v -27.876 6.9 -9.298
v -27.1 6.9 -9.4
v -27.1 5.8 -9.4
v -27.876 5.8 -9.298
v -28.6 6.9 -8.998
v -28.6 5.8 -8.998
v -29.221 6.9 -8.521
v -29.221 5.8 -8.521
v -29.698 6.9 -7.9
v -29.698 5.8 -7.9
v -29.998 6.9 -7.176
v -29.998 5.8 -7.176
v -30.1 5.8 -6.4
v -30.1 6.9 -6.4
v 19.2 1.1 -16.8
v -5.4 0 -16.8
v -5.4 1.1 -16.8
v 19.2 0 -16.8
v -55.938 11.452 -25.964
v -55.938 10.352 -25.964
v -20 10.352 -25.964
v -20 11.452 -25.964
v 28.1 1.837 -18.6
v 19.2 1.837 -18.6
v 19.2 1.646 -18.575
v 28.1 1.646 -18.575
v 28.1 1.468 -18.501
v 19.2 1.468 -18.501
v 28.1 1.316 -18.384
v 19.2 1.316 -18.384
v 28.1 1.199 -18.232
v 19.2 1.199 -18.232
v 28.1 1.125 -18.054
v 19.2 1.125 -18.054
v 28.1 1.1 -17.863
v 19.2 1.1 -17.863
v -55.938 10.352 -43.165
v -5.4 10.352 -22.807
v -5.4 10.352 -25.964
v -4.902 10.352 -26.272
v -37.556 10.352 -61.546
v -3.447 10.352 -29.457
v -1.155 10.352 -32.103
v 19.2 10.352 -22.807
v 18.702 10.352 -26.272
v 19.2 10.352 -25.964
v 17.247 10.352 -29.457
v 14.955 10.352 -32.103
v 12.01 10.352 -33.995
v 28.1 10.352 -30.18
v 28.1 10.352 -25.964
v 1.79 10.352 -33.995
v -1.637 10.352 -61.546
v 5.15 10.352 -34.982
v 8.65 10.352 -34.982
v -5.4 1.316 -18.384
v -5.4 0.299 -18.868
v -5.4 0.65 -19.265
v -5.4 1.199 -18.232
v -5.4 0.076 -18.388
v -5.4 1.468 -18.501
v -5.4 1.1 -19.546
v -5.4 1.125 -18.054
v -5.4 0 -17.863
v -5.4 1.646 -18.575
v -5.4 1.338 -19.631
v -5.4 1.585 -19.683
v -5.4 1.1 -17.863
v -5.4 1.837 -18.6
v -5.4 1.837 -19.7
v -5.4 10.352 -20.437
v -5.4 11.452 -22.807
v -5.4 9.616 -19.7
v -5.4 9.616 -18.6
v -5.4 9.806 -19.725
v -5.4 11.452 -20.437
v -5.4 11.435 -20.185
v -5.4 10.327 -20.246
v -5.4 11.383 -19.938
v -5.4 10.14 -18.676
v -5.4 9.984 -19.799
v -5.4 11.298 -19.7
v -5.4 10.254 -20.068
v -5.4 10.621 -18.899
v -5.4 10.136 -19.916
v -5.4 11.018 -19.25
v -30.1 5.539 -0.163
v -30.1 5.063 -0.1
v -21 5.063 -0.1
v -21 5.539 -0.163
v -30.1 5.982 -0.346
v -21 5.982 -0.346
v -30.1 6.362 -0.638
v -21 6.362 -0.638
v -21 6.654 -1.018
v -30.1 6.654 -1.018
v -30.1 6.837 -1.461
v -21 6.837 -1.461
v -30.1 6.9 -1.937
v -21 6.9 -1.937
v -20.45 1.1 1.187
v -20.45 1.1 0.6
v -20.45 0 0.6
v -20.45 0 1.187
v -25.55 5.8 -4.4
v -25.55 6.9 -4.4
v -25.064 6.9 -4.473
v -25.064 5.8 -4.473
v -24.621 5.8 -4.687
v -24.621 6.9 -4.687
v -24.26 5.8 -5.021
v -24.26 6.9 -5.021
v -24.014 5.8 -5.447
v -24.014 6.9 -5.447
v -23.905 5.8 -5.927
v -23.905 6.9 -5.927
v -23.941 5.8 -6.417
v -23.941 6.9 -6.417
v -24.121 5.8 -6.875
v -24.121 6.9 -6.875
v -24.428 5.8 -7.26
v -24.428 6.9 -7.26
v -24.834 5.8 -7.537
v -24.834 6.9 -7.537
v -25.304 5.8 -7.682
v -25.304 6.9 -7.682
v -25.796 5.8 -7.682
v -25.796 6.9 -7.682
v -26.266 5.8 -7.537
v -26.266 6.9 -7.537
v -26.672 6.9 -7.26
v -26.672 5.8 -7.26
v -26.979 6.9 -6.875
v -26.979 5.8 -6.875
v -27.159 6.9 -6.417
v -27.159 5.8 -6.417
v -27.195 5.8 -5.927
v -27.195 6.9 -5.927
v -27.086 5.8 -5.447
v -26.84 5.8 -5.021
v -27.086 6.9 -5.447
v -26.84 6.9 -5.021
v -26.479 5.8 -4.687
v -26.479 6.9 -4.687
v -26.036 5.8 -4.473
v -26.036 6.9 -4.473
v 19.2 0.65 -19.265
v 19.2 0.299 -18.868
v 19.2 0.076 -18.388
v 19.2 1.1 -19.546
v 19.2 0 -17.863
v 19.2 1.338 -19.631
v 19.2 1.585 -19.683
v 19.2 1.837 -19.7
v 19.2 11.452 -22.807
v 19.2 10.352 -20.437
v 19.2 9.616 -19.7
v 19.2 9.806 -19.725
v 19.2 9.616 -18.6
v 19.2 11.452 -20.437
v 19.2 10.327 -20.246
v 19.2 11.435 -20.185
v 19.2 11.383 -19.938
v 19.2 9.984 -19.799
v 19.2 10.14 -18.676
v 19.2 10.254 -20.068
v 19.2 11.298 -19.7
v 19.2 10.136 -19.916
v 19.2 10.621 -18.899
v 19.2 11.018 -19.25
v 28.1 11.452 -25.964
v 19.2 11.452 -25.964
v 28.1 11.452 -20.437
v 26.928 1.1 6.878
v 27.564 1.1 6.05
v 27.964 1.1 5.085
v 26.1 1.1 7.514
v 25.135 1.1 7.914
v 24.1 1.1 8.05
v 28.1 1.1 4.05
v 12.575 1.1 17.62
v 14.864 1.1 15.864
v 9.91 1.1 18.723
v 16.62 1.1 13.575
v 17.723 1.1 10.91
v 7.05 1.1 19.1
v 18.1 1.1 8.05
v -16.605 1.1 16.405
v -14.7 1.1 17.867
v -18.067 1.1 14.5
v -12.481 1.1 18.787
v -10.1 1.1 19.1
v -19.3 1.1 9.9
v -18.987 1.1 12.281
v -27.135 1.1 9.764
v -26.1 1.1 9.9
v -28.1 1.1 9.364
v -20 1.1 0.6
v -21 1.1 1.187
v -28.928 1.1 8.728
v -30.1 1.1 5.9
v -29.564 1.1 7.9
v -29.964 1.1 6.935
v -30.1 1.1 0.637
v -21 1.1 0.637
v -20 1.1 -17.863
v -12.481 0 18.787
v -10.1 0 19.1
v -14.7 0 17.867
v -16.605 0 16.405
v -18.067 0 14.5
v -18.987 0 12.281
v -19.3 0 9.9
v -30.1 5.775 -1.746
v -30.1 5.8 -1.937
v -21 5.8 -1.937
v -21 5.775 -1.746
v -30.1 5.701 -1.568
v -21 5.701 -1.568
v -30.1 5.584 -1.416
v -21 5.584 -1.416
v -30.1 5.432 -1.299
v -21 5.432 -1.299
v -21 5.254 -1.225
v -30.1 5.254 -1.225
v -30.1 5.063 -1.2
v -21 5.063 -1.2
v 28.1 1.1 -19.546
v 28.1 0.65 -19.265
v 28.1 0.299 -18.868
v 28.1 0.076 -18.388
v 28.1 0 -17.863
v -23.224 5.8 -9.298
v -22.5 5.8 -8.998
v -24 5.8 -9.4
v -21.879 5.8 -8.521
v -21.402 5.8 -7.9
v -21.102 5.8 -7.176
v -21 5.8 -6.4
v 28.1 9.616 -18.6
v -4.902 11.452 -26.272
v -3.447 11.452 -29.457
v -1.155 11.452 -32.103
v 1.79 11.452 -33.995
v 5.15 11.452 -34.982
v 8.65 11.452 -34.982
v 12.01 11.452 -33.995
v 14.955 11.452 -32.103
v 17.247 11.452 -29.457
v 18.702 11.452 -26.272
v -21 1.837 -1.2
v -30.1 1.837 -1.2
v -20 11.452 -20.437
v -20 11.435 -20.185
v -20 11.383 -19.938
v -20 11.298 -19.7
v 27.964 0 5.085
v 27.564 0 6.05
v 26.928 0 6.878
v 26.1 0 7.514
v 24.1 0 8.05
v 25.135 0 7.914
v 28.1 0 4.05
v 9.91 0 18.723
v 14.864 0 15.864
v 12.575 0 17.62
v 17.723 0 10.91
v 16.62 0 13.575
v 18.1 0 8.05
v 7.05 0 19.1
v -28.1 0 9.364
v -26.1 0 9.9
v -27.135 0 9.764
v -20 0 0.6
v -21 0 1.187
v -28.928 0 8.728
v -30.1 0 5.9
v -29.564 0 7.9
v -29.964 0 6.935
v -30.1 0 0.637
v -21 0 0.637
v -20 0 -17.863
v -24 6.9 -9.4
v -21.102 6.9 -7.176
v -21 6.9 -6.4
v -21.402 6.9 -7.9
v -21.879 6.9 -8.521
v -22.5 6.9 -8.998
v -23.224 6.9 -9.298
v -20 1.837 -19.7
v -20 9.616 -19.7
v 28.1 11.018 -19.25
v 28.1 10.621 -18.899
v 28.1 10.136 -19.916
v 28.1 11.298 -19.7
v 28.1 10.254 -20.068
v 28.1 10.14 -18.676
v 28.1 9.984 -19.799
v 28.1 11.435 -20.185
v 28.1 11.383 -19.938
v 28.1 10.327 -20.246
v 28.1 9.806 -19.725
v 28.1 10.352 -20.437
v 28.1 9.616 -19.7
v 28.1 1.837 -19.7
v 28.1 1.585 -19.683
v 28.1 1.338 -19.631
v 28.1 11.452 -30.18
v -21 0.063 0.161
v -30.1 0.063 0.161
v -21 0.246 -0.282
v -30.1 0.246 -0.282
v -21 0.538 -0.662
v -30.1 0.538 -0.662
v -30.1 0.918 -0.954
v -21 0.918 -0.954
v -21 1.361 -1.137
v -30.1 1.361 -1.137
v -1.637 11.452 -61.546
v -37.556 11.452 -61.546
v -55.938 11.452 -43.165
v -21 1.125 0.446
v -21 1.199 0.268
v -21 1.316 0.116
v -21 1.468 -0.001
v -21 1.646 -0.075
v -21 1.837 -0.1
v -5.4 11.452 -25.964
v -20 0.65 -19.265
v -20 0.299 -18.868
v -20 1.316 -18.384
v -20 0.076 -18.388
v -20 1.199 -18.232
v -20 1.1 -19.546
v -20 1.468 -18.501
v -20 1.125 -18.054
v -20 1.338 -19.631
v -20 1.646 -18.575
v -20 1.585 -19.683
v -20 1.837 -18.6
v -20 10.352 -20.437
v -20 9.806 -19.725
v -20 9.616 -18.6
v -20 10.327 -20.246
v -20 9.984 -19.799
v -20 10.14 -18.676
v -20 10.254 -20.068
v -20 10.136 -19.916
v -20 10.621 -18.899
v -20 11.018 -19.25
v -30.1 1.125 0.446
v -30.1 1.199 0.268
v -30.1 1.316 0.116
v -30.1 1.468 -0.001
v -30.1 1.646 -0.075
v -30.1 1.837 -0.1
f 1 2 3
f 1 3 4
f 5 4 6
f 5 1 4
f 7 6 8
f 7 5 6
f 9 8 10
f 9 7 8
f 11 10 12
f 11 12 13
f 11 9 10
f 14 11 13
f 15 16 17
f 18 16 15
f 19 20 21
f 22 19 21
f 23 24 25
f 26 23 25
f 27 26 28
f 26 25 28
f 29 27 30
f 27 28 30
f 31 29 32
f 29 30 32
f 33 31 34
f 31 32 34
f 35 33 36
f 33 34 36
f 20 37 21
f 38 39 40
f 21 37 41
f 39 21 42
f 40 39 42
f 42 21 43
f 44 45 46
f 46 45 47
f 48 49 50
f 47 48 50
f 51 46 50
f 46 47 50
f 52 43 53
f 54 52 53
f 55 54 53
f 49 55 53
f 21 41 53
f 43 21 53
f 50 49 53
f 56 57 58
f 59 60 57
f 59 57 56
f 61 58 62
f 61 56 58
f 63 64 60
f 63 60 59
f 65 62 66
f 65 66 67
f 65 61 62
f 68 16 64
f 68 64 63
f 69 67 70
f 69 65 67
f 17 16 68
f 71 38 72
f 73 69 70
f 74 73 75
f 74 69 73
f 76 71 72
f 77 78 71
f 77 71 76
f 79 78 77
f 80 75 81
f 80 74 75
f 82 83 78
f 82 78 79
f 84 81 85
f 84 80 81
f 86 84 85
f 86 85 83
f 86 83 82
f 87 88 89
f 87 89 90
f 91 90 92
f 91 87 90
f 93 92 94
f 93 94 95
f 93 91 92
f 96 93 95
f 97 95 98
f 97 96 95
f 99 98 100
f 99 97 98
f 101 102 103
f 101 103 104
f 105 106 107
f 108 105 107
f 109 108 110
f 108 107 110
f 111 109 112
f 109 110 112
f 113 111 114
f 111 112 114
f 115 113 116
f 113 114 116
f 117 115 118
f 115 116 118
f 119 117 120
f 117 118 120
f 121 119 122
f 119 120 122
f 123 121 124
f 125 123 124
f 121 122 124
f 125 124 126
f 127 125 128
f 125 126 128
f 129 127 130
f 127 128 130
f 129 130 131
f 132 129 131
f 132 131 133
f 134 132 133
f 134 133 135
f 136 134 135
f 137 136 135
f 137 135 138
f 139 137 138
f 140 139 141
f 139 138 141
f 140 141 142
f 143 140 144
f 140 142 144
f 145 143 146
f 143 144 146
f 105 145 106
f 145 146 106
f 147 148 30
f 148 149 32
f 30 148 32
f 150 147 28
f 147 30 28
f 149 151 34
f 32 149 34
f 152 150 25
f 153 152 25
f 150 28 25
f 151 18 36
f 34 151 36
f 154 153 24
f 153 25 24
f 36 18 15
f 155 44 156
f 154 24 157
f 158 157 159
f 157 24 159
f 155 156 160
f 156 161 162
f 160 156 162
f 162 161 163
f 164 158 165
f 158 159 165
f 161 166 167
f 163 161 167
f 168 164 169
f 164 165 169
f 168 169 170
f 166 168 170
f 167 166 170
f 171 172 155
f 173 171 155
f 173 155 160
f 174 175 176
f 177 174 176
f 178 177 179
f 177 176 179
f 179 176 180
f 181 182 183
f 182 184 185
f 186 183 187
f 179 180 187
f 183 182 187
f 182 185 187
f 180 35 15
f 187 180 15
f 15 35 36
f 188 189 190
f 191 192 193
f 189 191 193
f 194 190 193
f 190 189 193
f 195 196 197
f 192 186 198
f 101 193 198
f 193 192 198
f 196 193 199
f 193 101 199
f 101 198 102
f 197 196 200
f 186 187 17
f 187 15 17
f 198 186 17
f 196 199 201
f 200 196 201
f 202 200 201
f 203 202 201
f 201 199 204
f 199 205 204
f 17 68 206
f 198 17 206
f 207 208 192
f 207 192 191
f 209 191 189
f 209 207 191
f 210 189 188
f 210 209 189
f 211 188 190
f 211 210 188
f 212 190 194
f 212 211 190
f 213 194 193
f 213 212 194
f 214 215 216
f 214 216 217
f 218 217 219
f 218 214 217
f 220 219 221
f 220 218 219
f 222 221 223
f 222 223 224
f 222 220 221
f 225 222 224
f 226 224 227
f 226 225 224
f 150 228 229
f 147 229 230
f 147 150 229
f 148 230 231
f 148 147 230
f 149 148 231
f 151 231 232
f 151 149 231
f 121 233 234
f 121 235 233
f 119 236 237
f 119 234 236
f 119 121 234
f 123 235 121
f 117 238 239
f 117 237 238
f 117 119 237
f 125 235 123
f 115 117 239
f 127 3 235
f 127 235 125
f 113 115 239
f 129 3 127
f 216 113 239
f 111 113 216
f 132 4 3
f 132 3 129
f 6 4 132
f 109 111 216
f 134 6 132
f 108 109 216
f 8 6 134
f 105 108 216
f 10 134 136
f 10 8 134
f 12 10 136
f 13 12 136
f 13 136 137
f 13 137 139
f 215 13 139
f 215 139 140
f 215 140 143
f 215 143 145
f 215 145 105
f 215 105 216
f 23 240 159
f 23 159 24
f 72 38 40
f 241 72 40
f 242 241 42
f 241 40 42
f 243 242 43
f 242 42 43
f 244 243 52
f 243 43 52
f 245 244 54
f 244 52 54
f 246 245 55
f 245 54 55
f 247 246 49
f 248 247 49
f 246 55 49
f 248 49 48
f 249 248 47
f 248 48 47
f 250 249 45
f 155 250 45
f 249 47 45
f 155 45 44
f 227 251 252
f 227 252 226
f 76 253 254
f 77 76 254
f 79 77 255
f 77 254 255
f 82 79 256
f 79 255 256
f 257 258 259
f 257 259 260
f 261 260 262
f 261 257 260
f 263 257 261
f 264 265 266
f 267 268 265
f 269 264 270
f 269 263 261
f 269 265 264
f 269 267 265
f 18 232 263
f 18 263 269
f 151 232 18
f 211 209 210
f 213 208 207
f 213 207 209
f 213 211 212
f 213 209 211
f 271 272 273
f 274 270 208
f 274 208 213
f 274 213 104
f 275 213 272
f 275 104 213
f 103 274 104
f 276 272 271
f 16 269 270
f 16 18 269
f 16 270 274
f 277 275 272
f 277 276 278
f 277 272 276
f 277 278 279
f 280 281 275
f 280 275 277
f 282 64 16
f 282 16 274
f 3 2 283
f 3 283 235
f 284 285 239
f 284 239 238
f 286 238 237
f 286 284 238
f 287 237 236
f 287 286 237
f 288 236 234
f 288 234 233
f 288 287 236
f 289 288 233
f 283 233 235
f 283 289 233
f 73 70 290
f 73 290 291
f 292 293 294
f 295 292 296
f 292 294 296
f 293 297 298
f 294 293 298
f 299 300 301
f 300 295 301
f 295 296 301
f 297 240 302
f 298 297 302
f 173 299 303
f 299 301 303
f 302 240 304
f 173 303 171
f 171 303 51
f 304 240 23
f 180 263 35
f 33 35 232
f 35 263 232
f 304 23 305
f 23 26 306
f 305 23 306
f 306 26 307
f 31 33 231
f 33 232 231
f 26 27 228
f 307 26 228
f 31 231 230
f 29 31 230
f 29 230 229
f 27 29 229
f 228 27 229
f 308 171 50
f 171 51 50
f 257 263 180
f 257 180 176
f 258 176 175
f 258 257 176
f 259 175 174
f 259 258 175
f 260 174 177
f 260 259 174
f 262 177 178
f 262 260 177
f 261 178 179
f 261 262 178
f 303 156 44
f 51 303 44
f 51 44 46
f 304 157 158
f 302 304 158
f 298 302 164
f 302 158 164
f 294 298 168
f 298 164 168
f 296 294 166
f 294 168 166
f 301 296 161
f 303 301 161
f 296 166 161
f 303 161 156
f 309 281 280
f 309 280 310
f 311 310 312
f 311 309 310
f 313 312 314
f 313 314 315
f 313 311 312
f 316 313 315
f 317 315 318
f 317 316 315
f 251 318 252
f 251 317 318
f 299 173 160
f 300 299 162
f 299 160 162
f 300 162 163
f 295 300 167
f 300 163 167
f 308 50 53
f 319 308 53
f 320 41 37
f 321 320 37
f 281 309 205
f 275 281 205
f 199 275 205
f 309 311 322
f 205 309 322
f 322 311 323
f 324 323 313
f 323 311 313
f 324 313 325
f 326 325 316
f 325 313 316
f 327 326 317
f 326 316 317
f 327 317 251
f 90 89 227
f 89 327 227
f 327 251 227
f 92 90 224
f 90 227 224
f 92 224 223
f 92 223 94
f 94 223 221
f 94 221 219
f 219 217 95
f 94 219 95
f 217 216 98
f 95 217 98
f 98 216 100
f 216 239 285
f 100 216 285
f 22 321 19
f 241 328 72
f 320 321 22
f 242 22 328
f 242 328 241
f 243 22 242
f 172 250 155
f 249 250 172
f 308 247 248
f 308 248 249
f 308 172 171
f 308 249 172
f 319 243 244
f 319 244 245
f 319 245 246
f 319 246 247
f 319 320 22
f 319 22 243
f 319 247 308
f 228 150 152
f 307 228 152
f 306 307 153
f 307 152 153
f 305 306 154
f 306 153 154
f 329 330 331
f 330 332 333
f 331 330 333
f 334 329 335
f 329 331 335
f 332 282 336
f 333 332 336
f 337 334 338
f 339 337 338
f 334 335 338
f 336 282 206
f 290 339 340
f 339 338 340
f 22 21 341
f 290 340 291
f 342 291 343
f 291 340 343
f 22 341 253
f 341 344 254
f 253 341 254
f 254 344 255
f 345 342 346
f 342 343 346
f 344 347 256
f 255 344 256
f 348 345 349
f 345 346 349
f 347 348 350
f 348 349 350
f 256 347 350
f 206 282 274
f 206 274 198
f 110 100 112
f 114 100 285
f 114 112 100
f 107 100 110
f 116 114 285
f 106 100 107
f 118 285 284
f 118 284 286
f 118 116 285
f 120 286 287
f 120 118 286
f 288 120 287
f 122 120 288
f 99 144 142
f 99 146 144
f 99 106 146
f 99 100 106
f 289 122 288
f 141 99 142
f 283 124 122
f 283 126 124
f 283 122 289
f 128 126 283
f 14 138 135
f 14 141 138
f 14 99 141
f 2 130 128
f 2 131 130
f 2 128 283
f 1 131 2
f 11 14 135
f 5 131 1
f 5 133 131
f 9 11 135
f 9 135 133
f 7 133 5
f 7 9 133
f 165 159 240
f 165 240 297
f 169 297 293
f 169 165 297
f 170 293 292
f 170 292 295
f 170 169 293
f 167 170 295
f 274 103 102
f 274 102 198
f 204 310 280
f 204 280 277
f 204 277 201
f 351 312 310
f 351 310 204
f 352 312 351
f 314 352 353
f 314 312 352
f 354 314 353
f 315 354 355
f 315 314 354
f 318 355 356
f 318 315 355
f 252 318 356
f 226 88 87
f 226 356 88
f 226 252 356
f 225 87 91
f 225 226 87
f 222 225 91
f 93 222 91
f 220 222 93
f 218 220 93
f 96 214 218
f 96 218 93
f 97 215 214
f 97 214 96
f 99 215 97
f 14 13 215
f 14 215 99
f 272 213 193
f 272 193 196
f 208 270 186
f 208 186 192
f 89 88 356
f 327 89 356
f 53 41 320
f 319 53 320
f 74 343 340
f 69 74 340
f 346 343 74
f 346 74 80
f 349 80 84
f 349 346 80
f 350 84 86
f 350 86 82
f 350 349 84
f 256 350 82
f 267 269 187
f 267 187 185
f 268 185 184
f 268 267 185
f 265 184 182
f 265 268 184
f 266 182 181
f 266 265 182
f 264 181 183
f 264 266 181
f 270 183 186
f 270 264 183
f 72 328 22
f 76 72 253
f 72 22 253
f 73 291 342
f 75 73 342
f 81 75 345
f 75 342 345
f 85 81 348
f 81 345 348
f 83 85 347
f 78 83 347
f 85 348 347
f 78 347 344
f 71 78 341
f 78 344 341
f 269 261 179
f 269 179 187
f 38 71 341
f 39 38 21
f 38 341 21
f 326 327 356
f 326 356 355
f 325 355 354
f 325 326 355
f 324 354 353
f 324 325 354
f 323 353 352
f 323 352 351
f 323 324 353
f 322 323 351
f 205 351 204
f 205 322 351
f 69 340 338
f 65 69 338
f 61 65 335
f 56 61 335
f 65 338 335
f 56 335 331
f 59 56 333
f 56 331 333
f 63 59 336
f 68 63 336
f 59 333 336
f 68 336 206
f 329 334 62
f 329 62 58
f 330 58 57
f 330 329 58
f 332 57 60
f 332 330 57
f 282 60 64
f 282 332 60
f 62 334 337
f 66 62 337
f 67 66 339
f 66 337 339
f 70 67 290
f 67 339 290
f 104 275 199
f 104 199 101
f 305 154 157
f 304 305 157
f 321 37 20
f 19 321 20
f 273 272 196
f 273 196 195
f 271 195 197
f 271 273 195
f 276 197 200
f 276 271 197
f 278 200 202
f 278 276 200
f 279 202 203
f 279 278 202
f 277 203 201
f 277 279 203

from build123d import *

# Parameters (mm, degrees)
BASE_FLANGE1_DEPTH            = 1.1
EDGE_FLANGE1_STRIP_W          = 5.8732
EDGE_FLANGE1_STRIP_H          = 1.1
EDGE_FLANGE1_STRIP_CUT_DEPTH  = 9.1
EDGE_FLANGE1_RELIEF_W         = 6.4232
EDGE_FLANGE1_RELIEF_H         = 0.55
EDGE_FLANGE1_RELIEF_CUT_DEPTH = 1.1
EDGE_FLANGE1_DEPTH            = 9.1
EDGE_FLANGE2_STRIP_W          = 5.8732
EDGE_FLANGE2_STRIP_H          = 1.1
EDGE_FLANGE2_STRIP_CUT_DEPTH  = 9.1
EDGE_FLANGE2_DEPTH            = 9.1
SKETCH9_R                     = 1.65
EXTRUDE1_DEPTH                = 1.1
SKETCHED_START                = -55.937504649
SKETCHED_BEND2_DEPTH          = 84.037504649
SKETCHED_START_2              = -37.556301802
SKETCHED_BEND2_2_OUTLINE_W    = 35.581961475
SKETCHED_BEND2_2_OUTLINE_H    = 1.1
SKETCHED_BEND2_2_DEPTH        = 32.156301802
SKETCHED_START_3              = -20
SKETCHED_BEND2_3_DEPTH        = 14.6
SKETCHED_START_4              = 19.2
SKETCHED_BEND2_4_DEPTH        = 8.9
SKETCHED_START_5              = -19.700000012
SKETCHED_BEND2_5_DEPTH        = 1.100000011
SKETCHED_BEND5_DEPTH          = 84.037504649
SKETCHED_BEND5_2_OUTLINE_W    = 1.1
SKETCHED_BEND5_2_OUTLINE_H    = 35.581961474
SKETCHED_BEND5_2_DEPTH        = 32.156301802
SKETCHED_BEND5_3_DEPTH        = 14.6
SKETCHED_BEND5_4_DEPTH        = 8.9
SKETCHED_START_6              = 10.352213433
SKETCHED_BEND5_5_DEPTH        = 1.1


with BuildPart() as part:
    # Base-Flange1: sheet metal written as solids
    # Sketch1 → Base-Flange1 (new body)
    with BuildSketch(Plane(origin=(0, 0, 0), x_dir=(1, 0, 0), z_dir=(0, 1, 0))):
        with BuildLine():
            Line((-30.1, 1.2), (-21, 1.2))
            Line((-21, 1.2), (-21, -0.6))
            Line((-21, -0.6), (-20, -0.6))
            Line((-20, -0.6), (-20, 19.7))
            Line((-20, 19.7), (-20, 32.054788892))
            Line((-20, 32.054788892), (-20, 35.211930536))
            Line((-20, 35.211930536), (-55.937504649, 35.211930536))
            Line((-55.937504649, 35.211930536), (-55.937504649, 52.412689164))
            Line((-55.937504649, 52.412689164), (-37.556301802, 70.793892011))
            Line((-37.556301802, 70.793892011), (-1.637070551, 70.793892011))
            Line((-1.637070551, 70.793892011), (28.1, 39.427802749))
            Line((28.1, 39.427802749), (28.1, 32.054788892))
            Line((28.1, 32.054788892), (28.1, 19.7))
            Line((28.1, 19.7), (28.1, -4.05))
            ThreePointArc((28.1, -4.05), (26.928427125, -6.878427125), (24.1, -8.05))
            Line((24.1, -8.05), (18.1, -8.05))
            ThreePointArc((18.1, -8.05), (14.863529932, -15.863529932), (7.05, -19.1))
            Line((7.05, -19.1), (-10.1, -19.1))
            ThreePointArc((-10.1, -19.1), (-16.605382387, -16.405382387), (-19.3, -9.9))
            Line((-19.3, -9.9), (-26.1, -9.9))
            ThreePointArc((-26.1, -9.9), (-28.928427125, -8.728427125), (-30.1, -5.9))
            Line((-30.1, -5.9), (-30.1, 1.2))
        make_face()
        with BuildLine():
            Line((-5.4, 19.7), (-5.4, 16.8))
            Line((-5.4, 16.8), (19.2, 16.8))
            Line((19.2, 16.8), (19.2, 19.7))
            Line((19.2, 19.7), (19.2, 32.054788892))
            ThreePointArc((19.2, 32.054788892), (6.9, 44.354788892), (-5.4, 32.054788892))
            Line((-5.4, 32.054788892), (-5.4, 19.7))
        make_face(mode=Mode.SUBTRACT)
    extrude(amount=BASE_FLANGE1_DEPTH)

    # Edge-Flange1: sheet metal written as solids
    # Edge-Flange1 strip (on a plane across the edge) → Edge-Flange1 strip cut (cut)
    with BuildSketch(Plane(origin=(-21, 1.1, -1.2), x_dir=(0, 0, 1), z_dir=(-1, 0, 0))):
        with Locations((-1.1, -0.55)):
            Rectangle(EDGE_FLANGE1_STRIP_W, EDGE_FLANGE1_STRIP_H)
    extrude(amount=EDGE_FLANGE1_STRIP_CUT_DEPTH, mode=Mode.SUBTRACT)

    # Edge-Flange1 relief (on the sheet) → Edge-Flange1 relief cut (cut)
    with BuildSketch(Plane(origin=(-21, 1.1, 0.6366), x_dir=(0, 0, 1), z_dir=(0, 1, 0))):
        with Locations((-2.6616, 0.275)):
            Rectangle(EDGE_FLANGE1_RELIEF_W, EDGE_FLANGE1_RELIEF_H)
    extrude(amount=-EDGE_FLANGE1_RELIEF_CUT_DEPTH, mode=Mode.SUBTRACT)

    # Edge-Flange1 section (on a plane across the edge) → Edge-Flange1 (add)
    with BuildSketch(Plane(origin=(-21, 1.1, -1.2), x_dir=(0, 0, 1), z_dir=(-1, 0, 0))):
        with BuildLine():
            Line((0, 0.7366), (0, 5.8))
            Line((0, 5.8), (1.1, 5.8))
            Line((1.1, 5.8), (1.1, 0.7366))
            ThreePointArc((1.1, 0.7366), (1.315745145, 0.215745145), (1.8366, 0))
            Line((1.8366, 0), (1.8366, -1.1))
            ThreePointArc((1.8366, -1.1), (0.537927686, -0.562072314), (0, 0.7366))
        make_face()
    extrude(amount=EDGE_FLANGE1_DEPTH)

    # Edge-Flange2: sheet metal written as solids
    # Edge-Flange2 strip (on a plane across the edge) → Edge-Flange2 strip cut (cut)
    with BuildSketch(Plane(origin=(-30.1, 6.9, -1.2), x_dir=(0, -1, 0), z_dir=(1, 0, 0))):
        with Locations((-1.1, -0.55)):
            Rectangle(EDGE_FLANGE2_STRIP_W, EDGE_FLANGE2_STRIP_H)
    extrude(amount=EDGE_FLANGE2_STRIP_CUT_DEPTH, mode=Mode.SUBTRACT)

    # Edge-Flange2 section (on a plane across the edge) → Edge-Flange2 (add)
    with BuildSketch(Plane(origin=(-30.1, 6.9, -1.2), x_dir=(0, -1, 0), z_dir=(1, 0, 0))):
        with BuildLine():
            Line((0, 0.7366), (0, 8.2))
            Line((0, 8.2), (1.1, 8.2))
            Line((1.1, 8.2), (1.1, 0.7366))
            ThreePointArc((1.1, 0.7366), (1.315745145, 0.215745145), (1.8366, 0))
            Line((1.8366, 0), (1.8366, -1.1))
            ThreePointArc((1.8366, -1.1), (0.537927686, -0.562072314), (0, 0.7366))
        make_face()
    extrude(amount=EDGE_FLANGE2_DEPTH)

    # Sketch9 → Extrude1 (cut)
    with BuildSketch(Plane(origin=(0, 6.9, 0), x_dir=(1, 0, 0), z_dir=(0, 1, 0))):
        with Locations(Location((-25.55, 6.05, 0), (0, 0, 270))):
            Circle(SKETCH9_R)
        with BuildLine():
            Line((-30.1, 6.4), (-30.1, 9.4))
            Line((-30.1, 9.4), (-27.1, 9.4))
            ThreePointArc((-27.1, 9.4), (-29.221320344, 8.521320344), (-30.1, 6.4))
        make_face()
        with BuildLine():
            Line((-24, 9.4), (-21, 9.4))
            Line((-21, 9.4), (-21, 6.4))
            ThreePointArc((-21, 6.4), (-21.878679656, 8.521320344), (-24, 9.4))
        make_face()
    extrude(amount=-EXTRUDE1_DEPTH, mode=Mode.SUBTRACT)

    # Sketched Bend2: read off the stored shape, not the designer's step
    # Sketched Bend2 outline → Sketched Bend2 (cut)
    with BuildSketch(Plane.YZ.offset(SKETCHED_START)):
        with BuildLine():
            ThreePointArc((1.1, -19.545814945), (0.299404636, -18.868452246), (-1.3e-08, -17.8634))
            Line((-1.3e-08, -17.8634), (0, -70.793892011))
            Line((0, -70.793892011), (1.1, -70.793892011))
            Line((1.1, -70.793892011), (1.1, -19.545814945))
        make_face()
    extrude(amount=SKETCHED_BEND2_DEPTH, mode=Mode.SUBTRACT)



with BuildPart() as body_2:
    # Sketched Bend2 2 outline → Sketched Bend2 2 (new body)
    with BuildSketch(Plane.YZ.offset(SKETCHED_START_2)):
        with Locations((34.95512472, -19.15)):
            Rectangle(SKETCHED_BEND2_2_OUTLINE_W, SKETCHED_BEND2_2_OUTLINE_H)
    extrude(amount=SKETCHED_BEND2_2_DEPTH)


with BuildPart() as part_1:
    add(part.part)

    add(body_2.part)  # Sketched Bend2 3 merges body 2
    # Sketched Bend2 3 outline → Sketched Bend2 3 (add)
    with BuildSketch(Plane.YZ.offset(SKETCHED_START_3)):
        with BuildLine():
            Line((17.164143982, -18.6), (1.836600013, -18.600000013))
            ThreePointArc((1.836600013, -18.600000013), (1.315745141, -18.384254868), (1.099999987, -17.8634))
            Line((1.099999987, -17.8634), (1.1, -19.545814945))
            ThreePointArc((1.1, -19.545814945), (1.460317993, -19.661040525), (1.8366, -19.700000013))
            Line((1.8366, -19.700000013), (17.164143982, -19.7))
            Line((17.164143982, -19.7), (17.164143982, -18.6))
        make_face()
    extrude(amount=SKETCHED_BEND2_3_DEPTH)

    # Sketched Bend2 4 outline → Sketched Bend2 4 (add)
    with BuildSketch(Plane.YZ.offset(SKETCHED_START_4)):
        with BuildLine():
            Line((17.164143982, -18.6), (1.836600013, -18.600000013))
            ThreePointArc((1.836600013, -18.600000013), (1.315745141, -18.384254868), (1.099999987, -17.8634))
            Line((1.099999987, -17.8634), (1.1, -19.545814945))
            ThreePointArc((1.1, -19.545814945), (1.460317993, -19.661040525), (1.8366, -19.700000013))
            Line((1.8366, -19.700000013), (17.164143982, -19.7))
            Line((17.164143982, -19.7), (17.164143982, -18.6))
        make_face()
    extrude(amount=SKETCHED_BEND2_4_DEPTH)

    # Sketched Bend2 5 outline → Sketched Bend2 5 (add)
    with BuildSketch(Plane.XY.offset(SKETCHED_START_5)):
        Polygon((-37.556301802, 17.164143982), (-37.556301802, 52.746105457), (-55.937504649, 34.36490261), (-55.937504649, 17.164143982), align=None)
        with BuildLine():
            Line((28.1, 17.164143982), (28.1, 21.380016195))
            Line((28.1, 21.380016195), (-1.637070551, 52.746105457))
            Line((-1.637070551, 52.746105457), (-5.4, 52.746105457))
            Line((-5.4, 52.746105457), (-5.4, 14.007002338))
            ThreePointArc((-5.4, 14.007002338), (6.9, 26.307002338), (19.2, 14.007002338))
            Line((19.2, 14.007002338), (19.2, 17.164143982))
            Line((19.2, 17.164143982), (28.1, 17.164143982))
        make_face()
    extrude(amount=SKETCHED_BEND2_5_DEPTH)

    # Sketched Bend5: read off the stored shape, not the designer's step
    # Sketched Bend5 outline → Sketched Bend5 (cut)
    with BuildSketch(Plane.YZ.offset(SKETCHED_START)):
        with BuildLine():
            ThreePointArc((9.615613433, -18.599999993), (10.620665676, -18.89940464), (11.298028372, -19.7))
            Line((11.298028372, -19.7), (52.746105457, -19.7))
            Line((52.746105457, -19.7), (52.746105457, -18.6))
            Line((52.746105457, -18.6), (9.615613433, -18.599999993))
        make_face()
    extrude(amount=SKETCHED_BEND5_DEPTH, mode=Mode.SUBTRACT)



with BuildPart() as body_2_2:
    # Sketched Bend5 2 outline → Sketched Bend5 2 (new body)
    with BuildSketch(Plane.YZ.offset(SKETCHED_START_2)):
        with Locations((10.902213433, -43.755124732)):
            Rectangle(SKETCHED_BEND5_2_OUTLINE_W, SKETCHED_BEND5_2_OUTLINE_H)
    extrude(amount=SKETCHED_BEND5_2_DEPTH)


with BuildPart() as part_2:
    add(part_1.part)

    add(body_2_2.part)  # Sketched Bend5 3 merges body 2 2
    # Sketched Bend5 3 outline → Sketched Bend5 3 (add)
    with BuildSketch(Plane.YZ.offset(SKETCHED_START_3)):
        with BuildLine():
            ThreePointArc((11.45221344, -20.4366), (11.413253953, -20.060317993), (11.298028372, -19.7))
            Line((11.298028372, -19.7), (9.615613433, -19.699999993))
            ThreePointArc((9.615613433, -19.699999993), (10.136468293, -19.91574514), (10.35221344, -20.4366))
            Line((10.35221344, -20.4366), (10.352213433, -25.964143995))
            Line((10.352213433, -25.964143995), (11.452213433, -25.964143995))
            Line((11.452213433, -25.964143995), (11.45221344, -20.4366))
        make_face()
    extrude(amount=SKETCHED_BEND5_3_DEPTH)

    # Sketched Bend5 4 outline → Sketched Bend5 4 (add)
    with BuildSketch(Plane.YZ.offset(SKETCHED_START_4)):
        with BuildLine():
            ThreePointArc((11.45221344, -20.4366), (11.413253953, -20.060317993), (11.298028372, -19.7))
            Line((11.298028372, -19.7), (9.615613433, -19.699999993))
            ThreePointArc((9.615613433, -19.699999993), (10.136468293, -19.91574514), (10.35221344, -20.4366))
            Line((10.35221344, -20.4366), (10.352213433, -25.964143995))
            Line((10.352213433, -25.964143995), (11.452213433, -25.964143995))
            Line((11.452213433, -25.964143995), (11.45221344, -20.4366))
        make_face()
    extrude(amount=SKETCHED_BEND5_4_DEPTH)

    # Sketched Bend5 5 outline → Sketched Bend5 5 (add)
    with BuildSketch(Plane(origin=(0, 0, 0), x_dir=(1, 0, 0), z_dir=(0, 1, 0)).offset(SKETCHED_START_6)):
        Polygon((-37.556301802, 25.964143995), (-37.556301802, 61.546105469), (-55.937504649, 43.164902622), (-55.937504649, 25.964143995), align=None)
        with BuildLine():
            Line((28.1, 25.964143995), (28.1, 30.180016207))
            Line((28.1, 30.180016207), (-1.637070551, 61.546105469))
            Line((-1.637070551, 61.546105469), (-5.4, 61.546105469))
            Line((-5.4, 61.546105469), (-5.4, 22.80700235))
            ThreePointArc((-5.4, 22.80700235), (6.9, 35.10700235), (19.2, 22.80700235))
            Line((19.2, 22.80700235), (19.2, 25.964143995))
            Line((19.2, 25.964143995), (28.1, 25.964143995))
        make_face()
    extrude(amount=SKETCHED_BEND5_5_DEPTH)


solid = part_2.part
